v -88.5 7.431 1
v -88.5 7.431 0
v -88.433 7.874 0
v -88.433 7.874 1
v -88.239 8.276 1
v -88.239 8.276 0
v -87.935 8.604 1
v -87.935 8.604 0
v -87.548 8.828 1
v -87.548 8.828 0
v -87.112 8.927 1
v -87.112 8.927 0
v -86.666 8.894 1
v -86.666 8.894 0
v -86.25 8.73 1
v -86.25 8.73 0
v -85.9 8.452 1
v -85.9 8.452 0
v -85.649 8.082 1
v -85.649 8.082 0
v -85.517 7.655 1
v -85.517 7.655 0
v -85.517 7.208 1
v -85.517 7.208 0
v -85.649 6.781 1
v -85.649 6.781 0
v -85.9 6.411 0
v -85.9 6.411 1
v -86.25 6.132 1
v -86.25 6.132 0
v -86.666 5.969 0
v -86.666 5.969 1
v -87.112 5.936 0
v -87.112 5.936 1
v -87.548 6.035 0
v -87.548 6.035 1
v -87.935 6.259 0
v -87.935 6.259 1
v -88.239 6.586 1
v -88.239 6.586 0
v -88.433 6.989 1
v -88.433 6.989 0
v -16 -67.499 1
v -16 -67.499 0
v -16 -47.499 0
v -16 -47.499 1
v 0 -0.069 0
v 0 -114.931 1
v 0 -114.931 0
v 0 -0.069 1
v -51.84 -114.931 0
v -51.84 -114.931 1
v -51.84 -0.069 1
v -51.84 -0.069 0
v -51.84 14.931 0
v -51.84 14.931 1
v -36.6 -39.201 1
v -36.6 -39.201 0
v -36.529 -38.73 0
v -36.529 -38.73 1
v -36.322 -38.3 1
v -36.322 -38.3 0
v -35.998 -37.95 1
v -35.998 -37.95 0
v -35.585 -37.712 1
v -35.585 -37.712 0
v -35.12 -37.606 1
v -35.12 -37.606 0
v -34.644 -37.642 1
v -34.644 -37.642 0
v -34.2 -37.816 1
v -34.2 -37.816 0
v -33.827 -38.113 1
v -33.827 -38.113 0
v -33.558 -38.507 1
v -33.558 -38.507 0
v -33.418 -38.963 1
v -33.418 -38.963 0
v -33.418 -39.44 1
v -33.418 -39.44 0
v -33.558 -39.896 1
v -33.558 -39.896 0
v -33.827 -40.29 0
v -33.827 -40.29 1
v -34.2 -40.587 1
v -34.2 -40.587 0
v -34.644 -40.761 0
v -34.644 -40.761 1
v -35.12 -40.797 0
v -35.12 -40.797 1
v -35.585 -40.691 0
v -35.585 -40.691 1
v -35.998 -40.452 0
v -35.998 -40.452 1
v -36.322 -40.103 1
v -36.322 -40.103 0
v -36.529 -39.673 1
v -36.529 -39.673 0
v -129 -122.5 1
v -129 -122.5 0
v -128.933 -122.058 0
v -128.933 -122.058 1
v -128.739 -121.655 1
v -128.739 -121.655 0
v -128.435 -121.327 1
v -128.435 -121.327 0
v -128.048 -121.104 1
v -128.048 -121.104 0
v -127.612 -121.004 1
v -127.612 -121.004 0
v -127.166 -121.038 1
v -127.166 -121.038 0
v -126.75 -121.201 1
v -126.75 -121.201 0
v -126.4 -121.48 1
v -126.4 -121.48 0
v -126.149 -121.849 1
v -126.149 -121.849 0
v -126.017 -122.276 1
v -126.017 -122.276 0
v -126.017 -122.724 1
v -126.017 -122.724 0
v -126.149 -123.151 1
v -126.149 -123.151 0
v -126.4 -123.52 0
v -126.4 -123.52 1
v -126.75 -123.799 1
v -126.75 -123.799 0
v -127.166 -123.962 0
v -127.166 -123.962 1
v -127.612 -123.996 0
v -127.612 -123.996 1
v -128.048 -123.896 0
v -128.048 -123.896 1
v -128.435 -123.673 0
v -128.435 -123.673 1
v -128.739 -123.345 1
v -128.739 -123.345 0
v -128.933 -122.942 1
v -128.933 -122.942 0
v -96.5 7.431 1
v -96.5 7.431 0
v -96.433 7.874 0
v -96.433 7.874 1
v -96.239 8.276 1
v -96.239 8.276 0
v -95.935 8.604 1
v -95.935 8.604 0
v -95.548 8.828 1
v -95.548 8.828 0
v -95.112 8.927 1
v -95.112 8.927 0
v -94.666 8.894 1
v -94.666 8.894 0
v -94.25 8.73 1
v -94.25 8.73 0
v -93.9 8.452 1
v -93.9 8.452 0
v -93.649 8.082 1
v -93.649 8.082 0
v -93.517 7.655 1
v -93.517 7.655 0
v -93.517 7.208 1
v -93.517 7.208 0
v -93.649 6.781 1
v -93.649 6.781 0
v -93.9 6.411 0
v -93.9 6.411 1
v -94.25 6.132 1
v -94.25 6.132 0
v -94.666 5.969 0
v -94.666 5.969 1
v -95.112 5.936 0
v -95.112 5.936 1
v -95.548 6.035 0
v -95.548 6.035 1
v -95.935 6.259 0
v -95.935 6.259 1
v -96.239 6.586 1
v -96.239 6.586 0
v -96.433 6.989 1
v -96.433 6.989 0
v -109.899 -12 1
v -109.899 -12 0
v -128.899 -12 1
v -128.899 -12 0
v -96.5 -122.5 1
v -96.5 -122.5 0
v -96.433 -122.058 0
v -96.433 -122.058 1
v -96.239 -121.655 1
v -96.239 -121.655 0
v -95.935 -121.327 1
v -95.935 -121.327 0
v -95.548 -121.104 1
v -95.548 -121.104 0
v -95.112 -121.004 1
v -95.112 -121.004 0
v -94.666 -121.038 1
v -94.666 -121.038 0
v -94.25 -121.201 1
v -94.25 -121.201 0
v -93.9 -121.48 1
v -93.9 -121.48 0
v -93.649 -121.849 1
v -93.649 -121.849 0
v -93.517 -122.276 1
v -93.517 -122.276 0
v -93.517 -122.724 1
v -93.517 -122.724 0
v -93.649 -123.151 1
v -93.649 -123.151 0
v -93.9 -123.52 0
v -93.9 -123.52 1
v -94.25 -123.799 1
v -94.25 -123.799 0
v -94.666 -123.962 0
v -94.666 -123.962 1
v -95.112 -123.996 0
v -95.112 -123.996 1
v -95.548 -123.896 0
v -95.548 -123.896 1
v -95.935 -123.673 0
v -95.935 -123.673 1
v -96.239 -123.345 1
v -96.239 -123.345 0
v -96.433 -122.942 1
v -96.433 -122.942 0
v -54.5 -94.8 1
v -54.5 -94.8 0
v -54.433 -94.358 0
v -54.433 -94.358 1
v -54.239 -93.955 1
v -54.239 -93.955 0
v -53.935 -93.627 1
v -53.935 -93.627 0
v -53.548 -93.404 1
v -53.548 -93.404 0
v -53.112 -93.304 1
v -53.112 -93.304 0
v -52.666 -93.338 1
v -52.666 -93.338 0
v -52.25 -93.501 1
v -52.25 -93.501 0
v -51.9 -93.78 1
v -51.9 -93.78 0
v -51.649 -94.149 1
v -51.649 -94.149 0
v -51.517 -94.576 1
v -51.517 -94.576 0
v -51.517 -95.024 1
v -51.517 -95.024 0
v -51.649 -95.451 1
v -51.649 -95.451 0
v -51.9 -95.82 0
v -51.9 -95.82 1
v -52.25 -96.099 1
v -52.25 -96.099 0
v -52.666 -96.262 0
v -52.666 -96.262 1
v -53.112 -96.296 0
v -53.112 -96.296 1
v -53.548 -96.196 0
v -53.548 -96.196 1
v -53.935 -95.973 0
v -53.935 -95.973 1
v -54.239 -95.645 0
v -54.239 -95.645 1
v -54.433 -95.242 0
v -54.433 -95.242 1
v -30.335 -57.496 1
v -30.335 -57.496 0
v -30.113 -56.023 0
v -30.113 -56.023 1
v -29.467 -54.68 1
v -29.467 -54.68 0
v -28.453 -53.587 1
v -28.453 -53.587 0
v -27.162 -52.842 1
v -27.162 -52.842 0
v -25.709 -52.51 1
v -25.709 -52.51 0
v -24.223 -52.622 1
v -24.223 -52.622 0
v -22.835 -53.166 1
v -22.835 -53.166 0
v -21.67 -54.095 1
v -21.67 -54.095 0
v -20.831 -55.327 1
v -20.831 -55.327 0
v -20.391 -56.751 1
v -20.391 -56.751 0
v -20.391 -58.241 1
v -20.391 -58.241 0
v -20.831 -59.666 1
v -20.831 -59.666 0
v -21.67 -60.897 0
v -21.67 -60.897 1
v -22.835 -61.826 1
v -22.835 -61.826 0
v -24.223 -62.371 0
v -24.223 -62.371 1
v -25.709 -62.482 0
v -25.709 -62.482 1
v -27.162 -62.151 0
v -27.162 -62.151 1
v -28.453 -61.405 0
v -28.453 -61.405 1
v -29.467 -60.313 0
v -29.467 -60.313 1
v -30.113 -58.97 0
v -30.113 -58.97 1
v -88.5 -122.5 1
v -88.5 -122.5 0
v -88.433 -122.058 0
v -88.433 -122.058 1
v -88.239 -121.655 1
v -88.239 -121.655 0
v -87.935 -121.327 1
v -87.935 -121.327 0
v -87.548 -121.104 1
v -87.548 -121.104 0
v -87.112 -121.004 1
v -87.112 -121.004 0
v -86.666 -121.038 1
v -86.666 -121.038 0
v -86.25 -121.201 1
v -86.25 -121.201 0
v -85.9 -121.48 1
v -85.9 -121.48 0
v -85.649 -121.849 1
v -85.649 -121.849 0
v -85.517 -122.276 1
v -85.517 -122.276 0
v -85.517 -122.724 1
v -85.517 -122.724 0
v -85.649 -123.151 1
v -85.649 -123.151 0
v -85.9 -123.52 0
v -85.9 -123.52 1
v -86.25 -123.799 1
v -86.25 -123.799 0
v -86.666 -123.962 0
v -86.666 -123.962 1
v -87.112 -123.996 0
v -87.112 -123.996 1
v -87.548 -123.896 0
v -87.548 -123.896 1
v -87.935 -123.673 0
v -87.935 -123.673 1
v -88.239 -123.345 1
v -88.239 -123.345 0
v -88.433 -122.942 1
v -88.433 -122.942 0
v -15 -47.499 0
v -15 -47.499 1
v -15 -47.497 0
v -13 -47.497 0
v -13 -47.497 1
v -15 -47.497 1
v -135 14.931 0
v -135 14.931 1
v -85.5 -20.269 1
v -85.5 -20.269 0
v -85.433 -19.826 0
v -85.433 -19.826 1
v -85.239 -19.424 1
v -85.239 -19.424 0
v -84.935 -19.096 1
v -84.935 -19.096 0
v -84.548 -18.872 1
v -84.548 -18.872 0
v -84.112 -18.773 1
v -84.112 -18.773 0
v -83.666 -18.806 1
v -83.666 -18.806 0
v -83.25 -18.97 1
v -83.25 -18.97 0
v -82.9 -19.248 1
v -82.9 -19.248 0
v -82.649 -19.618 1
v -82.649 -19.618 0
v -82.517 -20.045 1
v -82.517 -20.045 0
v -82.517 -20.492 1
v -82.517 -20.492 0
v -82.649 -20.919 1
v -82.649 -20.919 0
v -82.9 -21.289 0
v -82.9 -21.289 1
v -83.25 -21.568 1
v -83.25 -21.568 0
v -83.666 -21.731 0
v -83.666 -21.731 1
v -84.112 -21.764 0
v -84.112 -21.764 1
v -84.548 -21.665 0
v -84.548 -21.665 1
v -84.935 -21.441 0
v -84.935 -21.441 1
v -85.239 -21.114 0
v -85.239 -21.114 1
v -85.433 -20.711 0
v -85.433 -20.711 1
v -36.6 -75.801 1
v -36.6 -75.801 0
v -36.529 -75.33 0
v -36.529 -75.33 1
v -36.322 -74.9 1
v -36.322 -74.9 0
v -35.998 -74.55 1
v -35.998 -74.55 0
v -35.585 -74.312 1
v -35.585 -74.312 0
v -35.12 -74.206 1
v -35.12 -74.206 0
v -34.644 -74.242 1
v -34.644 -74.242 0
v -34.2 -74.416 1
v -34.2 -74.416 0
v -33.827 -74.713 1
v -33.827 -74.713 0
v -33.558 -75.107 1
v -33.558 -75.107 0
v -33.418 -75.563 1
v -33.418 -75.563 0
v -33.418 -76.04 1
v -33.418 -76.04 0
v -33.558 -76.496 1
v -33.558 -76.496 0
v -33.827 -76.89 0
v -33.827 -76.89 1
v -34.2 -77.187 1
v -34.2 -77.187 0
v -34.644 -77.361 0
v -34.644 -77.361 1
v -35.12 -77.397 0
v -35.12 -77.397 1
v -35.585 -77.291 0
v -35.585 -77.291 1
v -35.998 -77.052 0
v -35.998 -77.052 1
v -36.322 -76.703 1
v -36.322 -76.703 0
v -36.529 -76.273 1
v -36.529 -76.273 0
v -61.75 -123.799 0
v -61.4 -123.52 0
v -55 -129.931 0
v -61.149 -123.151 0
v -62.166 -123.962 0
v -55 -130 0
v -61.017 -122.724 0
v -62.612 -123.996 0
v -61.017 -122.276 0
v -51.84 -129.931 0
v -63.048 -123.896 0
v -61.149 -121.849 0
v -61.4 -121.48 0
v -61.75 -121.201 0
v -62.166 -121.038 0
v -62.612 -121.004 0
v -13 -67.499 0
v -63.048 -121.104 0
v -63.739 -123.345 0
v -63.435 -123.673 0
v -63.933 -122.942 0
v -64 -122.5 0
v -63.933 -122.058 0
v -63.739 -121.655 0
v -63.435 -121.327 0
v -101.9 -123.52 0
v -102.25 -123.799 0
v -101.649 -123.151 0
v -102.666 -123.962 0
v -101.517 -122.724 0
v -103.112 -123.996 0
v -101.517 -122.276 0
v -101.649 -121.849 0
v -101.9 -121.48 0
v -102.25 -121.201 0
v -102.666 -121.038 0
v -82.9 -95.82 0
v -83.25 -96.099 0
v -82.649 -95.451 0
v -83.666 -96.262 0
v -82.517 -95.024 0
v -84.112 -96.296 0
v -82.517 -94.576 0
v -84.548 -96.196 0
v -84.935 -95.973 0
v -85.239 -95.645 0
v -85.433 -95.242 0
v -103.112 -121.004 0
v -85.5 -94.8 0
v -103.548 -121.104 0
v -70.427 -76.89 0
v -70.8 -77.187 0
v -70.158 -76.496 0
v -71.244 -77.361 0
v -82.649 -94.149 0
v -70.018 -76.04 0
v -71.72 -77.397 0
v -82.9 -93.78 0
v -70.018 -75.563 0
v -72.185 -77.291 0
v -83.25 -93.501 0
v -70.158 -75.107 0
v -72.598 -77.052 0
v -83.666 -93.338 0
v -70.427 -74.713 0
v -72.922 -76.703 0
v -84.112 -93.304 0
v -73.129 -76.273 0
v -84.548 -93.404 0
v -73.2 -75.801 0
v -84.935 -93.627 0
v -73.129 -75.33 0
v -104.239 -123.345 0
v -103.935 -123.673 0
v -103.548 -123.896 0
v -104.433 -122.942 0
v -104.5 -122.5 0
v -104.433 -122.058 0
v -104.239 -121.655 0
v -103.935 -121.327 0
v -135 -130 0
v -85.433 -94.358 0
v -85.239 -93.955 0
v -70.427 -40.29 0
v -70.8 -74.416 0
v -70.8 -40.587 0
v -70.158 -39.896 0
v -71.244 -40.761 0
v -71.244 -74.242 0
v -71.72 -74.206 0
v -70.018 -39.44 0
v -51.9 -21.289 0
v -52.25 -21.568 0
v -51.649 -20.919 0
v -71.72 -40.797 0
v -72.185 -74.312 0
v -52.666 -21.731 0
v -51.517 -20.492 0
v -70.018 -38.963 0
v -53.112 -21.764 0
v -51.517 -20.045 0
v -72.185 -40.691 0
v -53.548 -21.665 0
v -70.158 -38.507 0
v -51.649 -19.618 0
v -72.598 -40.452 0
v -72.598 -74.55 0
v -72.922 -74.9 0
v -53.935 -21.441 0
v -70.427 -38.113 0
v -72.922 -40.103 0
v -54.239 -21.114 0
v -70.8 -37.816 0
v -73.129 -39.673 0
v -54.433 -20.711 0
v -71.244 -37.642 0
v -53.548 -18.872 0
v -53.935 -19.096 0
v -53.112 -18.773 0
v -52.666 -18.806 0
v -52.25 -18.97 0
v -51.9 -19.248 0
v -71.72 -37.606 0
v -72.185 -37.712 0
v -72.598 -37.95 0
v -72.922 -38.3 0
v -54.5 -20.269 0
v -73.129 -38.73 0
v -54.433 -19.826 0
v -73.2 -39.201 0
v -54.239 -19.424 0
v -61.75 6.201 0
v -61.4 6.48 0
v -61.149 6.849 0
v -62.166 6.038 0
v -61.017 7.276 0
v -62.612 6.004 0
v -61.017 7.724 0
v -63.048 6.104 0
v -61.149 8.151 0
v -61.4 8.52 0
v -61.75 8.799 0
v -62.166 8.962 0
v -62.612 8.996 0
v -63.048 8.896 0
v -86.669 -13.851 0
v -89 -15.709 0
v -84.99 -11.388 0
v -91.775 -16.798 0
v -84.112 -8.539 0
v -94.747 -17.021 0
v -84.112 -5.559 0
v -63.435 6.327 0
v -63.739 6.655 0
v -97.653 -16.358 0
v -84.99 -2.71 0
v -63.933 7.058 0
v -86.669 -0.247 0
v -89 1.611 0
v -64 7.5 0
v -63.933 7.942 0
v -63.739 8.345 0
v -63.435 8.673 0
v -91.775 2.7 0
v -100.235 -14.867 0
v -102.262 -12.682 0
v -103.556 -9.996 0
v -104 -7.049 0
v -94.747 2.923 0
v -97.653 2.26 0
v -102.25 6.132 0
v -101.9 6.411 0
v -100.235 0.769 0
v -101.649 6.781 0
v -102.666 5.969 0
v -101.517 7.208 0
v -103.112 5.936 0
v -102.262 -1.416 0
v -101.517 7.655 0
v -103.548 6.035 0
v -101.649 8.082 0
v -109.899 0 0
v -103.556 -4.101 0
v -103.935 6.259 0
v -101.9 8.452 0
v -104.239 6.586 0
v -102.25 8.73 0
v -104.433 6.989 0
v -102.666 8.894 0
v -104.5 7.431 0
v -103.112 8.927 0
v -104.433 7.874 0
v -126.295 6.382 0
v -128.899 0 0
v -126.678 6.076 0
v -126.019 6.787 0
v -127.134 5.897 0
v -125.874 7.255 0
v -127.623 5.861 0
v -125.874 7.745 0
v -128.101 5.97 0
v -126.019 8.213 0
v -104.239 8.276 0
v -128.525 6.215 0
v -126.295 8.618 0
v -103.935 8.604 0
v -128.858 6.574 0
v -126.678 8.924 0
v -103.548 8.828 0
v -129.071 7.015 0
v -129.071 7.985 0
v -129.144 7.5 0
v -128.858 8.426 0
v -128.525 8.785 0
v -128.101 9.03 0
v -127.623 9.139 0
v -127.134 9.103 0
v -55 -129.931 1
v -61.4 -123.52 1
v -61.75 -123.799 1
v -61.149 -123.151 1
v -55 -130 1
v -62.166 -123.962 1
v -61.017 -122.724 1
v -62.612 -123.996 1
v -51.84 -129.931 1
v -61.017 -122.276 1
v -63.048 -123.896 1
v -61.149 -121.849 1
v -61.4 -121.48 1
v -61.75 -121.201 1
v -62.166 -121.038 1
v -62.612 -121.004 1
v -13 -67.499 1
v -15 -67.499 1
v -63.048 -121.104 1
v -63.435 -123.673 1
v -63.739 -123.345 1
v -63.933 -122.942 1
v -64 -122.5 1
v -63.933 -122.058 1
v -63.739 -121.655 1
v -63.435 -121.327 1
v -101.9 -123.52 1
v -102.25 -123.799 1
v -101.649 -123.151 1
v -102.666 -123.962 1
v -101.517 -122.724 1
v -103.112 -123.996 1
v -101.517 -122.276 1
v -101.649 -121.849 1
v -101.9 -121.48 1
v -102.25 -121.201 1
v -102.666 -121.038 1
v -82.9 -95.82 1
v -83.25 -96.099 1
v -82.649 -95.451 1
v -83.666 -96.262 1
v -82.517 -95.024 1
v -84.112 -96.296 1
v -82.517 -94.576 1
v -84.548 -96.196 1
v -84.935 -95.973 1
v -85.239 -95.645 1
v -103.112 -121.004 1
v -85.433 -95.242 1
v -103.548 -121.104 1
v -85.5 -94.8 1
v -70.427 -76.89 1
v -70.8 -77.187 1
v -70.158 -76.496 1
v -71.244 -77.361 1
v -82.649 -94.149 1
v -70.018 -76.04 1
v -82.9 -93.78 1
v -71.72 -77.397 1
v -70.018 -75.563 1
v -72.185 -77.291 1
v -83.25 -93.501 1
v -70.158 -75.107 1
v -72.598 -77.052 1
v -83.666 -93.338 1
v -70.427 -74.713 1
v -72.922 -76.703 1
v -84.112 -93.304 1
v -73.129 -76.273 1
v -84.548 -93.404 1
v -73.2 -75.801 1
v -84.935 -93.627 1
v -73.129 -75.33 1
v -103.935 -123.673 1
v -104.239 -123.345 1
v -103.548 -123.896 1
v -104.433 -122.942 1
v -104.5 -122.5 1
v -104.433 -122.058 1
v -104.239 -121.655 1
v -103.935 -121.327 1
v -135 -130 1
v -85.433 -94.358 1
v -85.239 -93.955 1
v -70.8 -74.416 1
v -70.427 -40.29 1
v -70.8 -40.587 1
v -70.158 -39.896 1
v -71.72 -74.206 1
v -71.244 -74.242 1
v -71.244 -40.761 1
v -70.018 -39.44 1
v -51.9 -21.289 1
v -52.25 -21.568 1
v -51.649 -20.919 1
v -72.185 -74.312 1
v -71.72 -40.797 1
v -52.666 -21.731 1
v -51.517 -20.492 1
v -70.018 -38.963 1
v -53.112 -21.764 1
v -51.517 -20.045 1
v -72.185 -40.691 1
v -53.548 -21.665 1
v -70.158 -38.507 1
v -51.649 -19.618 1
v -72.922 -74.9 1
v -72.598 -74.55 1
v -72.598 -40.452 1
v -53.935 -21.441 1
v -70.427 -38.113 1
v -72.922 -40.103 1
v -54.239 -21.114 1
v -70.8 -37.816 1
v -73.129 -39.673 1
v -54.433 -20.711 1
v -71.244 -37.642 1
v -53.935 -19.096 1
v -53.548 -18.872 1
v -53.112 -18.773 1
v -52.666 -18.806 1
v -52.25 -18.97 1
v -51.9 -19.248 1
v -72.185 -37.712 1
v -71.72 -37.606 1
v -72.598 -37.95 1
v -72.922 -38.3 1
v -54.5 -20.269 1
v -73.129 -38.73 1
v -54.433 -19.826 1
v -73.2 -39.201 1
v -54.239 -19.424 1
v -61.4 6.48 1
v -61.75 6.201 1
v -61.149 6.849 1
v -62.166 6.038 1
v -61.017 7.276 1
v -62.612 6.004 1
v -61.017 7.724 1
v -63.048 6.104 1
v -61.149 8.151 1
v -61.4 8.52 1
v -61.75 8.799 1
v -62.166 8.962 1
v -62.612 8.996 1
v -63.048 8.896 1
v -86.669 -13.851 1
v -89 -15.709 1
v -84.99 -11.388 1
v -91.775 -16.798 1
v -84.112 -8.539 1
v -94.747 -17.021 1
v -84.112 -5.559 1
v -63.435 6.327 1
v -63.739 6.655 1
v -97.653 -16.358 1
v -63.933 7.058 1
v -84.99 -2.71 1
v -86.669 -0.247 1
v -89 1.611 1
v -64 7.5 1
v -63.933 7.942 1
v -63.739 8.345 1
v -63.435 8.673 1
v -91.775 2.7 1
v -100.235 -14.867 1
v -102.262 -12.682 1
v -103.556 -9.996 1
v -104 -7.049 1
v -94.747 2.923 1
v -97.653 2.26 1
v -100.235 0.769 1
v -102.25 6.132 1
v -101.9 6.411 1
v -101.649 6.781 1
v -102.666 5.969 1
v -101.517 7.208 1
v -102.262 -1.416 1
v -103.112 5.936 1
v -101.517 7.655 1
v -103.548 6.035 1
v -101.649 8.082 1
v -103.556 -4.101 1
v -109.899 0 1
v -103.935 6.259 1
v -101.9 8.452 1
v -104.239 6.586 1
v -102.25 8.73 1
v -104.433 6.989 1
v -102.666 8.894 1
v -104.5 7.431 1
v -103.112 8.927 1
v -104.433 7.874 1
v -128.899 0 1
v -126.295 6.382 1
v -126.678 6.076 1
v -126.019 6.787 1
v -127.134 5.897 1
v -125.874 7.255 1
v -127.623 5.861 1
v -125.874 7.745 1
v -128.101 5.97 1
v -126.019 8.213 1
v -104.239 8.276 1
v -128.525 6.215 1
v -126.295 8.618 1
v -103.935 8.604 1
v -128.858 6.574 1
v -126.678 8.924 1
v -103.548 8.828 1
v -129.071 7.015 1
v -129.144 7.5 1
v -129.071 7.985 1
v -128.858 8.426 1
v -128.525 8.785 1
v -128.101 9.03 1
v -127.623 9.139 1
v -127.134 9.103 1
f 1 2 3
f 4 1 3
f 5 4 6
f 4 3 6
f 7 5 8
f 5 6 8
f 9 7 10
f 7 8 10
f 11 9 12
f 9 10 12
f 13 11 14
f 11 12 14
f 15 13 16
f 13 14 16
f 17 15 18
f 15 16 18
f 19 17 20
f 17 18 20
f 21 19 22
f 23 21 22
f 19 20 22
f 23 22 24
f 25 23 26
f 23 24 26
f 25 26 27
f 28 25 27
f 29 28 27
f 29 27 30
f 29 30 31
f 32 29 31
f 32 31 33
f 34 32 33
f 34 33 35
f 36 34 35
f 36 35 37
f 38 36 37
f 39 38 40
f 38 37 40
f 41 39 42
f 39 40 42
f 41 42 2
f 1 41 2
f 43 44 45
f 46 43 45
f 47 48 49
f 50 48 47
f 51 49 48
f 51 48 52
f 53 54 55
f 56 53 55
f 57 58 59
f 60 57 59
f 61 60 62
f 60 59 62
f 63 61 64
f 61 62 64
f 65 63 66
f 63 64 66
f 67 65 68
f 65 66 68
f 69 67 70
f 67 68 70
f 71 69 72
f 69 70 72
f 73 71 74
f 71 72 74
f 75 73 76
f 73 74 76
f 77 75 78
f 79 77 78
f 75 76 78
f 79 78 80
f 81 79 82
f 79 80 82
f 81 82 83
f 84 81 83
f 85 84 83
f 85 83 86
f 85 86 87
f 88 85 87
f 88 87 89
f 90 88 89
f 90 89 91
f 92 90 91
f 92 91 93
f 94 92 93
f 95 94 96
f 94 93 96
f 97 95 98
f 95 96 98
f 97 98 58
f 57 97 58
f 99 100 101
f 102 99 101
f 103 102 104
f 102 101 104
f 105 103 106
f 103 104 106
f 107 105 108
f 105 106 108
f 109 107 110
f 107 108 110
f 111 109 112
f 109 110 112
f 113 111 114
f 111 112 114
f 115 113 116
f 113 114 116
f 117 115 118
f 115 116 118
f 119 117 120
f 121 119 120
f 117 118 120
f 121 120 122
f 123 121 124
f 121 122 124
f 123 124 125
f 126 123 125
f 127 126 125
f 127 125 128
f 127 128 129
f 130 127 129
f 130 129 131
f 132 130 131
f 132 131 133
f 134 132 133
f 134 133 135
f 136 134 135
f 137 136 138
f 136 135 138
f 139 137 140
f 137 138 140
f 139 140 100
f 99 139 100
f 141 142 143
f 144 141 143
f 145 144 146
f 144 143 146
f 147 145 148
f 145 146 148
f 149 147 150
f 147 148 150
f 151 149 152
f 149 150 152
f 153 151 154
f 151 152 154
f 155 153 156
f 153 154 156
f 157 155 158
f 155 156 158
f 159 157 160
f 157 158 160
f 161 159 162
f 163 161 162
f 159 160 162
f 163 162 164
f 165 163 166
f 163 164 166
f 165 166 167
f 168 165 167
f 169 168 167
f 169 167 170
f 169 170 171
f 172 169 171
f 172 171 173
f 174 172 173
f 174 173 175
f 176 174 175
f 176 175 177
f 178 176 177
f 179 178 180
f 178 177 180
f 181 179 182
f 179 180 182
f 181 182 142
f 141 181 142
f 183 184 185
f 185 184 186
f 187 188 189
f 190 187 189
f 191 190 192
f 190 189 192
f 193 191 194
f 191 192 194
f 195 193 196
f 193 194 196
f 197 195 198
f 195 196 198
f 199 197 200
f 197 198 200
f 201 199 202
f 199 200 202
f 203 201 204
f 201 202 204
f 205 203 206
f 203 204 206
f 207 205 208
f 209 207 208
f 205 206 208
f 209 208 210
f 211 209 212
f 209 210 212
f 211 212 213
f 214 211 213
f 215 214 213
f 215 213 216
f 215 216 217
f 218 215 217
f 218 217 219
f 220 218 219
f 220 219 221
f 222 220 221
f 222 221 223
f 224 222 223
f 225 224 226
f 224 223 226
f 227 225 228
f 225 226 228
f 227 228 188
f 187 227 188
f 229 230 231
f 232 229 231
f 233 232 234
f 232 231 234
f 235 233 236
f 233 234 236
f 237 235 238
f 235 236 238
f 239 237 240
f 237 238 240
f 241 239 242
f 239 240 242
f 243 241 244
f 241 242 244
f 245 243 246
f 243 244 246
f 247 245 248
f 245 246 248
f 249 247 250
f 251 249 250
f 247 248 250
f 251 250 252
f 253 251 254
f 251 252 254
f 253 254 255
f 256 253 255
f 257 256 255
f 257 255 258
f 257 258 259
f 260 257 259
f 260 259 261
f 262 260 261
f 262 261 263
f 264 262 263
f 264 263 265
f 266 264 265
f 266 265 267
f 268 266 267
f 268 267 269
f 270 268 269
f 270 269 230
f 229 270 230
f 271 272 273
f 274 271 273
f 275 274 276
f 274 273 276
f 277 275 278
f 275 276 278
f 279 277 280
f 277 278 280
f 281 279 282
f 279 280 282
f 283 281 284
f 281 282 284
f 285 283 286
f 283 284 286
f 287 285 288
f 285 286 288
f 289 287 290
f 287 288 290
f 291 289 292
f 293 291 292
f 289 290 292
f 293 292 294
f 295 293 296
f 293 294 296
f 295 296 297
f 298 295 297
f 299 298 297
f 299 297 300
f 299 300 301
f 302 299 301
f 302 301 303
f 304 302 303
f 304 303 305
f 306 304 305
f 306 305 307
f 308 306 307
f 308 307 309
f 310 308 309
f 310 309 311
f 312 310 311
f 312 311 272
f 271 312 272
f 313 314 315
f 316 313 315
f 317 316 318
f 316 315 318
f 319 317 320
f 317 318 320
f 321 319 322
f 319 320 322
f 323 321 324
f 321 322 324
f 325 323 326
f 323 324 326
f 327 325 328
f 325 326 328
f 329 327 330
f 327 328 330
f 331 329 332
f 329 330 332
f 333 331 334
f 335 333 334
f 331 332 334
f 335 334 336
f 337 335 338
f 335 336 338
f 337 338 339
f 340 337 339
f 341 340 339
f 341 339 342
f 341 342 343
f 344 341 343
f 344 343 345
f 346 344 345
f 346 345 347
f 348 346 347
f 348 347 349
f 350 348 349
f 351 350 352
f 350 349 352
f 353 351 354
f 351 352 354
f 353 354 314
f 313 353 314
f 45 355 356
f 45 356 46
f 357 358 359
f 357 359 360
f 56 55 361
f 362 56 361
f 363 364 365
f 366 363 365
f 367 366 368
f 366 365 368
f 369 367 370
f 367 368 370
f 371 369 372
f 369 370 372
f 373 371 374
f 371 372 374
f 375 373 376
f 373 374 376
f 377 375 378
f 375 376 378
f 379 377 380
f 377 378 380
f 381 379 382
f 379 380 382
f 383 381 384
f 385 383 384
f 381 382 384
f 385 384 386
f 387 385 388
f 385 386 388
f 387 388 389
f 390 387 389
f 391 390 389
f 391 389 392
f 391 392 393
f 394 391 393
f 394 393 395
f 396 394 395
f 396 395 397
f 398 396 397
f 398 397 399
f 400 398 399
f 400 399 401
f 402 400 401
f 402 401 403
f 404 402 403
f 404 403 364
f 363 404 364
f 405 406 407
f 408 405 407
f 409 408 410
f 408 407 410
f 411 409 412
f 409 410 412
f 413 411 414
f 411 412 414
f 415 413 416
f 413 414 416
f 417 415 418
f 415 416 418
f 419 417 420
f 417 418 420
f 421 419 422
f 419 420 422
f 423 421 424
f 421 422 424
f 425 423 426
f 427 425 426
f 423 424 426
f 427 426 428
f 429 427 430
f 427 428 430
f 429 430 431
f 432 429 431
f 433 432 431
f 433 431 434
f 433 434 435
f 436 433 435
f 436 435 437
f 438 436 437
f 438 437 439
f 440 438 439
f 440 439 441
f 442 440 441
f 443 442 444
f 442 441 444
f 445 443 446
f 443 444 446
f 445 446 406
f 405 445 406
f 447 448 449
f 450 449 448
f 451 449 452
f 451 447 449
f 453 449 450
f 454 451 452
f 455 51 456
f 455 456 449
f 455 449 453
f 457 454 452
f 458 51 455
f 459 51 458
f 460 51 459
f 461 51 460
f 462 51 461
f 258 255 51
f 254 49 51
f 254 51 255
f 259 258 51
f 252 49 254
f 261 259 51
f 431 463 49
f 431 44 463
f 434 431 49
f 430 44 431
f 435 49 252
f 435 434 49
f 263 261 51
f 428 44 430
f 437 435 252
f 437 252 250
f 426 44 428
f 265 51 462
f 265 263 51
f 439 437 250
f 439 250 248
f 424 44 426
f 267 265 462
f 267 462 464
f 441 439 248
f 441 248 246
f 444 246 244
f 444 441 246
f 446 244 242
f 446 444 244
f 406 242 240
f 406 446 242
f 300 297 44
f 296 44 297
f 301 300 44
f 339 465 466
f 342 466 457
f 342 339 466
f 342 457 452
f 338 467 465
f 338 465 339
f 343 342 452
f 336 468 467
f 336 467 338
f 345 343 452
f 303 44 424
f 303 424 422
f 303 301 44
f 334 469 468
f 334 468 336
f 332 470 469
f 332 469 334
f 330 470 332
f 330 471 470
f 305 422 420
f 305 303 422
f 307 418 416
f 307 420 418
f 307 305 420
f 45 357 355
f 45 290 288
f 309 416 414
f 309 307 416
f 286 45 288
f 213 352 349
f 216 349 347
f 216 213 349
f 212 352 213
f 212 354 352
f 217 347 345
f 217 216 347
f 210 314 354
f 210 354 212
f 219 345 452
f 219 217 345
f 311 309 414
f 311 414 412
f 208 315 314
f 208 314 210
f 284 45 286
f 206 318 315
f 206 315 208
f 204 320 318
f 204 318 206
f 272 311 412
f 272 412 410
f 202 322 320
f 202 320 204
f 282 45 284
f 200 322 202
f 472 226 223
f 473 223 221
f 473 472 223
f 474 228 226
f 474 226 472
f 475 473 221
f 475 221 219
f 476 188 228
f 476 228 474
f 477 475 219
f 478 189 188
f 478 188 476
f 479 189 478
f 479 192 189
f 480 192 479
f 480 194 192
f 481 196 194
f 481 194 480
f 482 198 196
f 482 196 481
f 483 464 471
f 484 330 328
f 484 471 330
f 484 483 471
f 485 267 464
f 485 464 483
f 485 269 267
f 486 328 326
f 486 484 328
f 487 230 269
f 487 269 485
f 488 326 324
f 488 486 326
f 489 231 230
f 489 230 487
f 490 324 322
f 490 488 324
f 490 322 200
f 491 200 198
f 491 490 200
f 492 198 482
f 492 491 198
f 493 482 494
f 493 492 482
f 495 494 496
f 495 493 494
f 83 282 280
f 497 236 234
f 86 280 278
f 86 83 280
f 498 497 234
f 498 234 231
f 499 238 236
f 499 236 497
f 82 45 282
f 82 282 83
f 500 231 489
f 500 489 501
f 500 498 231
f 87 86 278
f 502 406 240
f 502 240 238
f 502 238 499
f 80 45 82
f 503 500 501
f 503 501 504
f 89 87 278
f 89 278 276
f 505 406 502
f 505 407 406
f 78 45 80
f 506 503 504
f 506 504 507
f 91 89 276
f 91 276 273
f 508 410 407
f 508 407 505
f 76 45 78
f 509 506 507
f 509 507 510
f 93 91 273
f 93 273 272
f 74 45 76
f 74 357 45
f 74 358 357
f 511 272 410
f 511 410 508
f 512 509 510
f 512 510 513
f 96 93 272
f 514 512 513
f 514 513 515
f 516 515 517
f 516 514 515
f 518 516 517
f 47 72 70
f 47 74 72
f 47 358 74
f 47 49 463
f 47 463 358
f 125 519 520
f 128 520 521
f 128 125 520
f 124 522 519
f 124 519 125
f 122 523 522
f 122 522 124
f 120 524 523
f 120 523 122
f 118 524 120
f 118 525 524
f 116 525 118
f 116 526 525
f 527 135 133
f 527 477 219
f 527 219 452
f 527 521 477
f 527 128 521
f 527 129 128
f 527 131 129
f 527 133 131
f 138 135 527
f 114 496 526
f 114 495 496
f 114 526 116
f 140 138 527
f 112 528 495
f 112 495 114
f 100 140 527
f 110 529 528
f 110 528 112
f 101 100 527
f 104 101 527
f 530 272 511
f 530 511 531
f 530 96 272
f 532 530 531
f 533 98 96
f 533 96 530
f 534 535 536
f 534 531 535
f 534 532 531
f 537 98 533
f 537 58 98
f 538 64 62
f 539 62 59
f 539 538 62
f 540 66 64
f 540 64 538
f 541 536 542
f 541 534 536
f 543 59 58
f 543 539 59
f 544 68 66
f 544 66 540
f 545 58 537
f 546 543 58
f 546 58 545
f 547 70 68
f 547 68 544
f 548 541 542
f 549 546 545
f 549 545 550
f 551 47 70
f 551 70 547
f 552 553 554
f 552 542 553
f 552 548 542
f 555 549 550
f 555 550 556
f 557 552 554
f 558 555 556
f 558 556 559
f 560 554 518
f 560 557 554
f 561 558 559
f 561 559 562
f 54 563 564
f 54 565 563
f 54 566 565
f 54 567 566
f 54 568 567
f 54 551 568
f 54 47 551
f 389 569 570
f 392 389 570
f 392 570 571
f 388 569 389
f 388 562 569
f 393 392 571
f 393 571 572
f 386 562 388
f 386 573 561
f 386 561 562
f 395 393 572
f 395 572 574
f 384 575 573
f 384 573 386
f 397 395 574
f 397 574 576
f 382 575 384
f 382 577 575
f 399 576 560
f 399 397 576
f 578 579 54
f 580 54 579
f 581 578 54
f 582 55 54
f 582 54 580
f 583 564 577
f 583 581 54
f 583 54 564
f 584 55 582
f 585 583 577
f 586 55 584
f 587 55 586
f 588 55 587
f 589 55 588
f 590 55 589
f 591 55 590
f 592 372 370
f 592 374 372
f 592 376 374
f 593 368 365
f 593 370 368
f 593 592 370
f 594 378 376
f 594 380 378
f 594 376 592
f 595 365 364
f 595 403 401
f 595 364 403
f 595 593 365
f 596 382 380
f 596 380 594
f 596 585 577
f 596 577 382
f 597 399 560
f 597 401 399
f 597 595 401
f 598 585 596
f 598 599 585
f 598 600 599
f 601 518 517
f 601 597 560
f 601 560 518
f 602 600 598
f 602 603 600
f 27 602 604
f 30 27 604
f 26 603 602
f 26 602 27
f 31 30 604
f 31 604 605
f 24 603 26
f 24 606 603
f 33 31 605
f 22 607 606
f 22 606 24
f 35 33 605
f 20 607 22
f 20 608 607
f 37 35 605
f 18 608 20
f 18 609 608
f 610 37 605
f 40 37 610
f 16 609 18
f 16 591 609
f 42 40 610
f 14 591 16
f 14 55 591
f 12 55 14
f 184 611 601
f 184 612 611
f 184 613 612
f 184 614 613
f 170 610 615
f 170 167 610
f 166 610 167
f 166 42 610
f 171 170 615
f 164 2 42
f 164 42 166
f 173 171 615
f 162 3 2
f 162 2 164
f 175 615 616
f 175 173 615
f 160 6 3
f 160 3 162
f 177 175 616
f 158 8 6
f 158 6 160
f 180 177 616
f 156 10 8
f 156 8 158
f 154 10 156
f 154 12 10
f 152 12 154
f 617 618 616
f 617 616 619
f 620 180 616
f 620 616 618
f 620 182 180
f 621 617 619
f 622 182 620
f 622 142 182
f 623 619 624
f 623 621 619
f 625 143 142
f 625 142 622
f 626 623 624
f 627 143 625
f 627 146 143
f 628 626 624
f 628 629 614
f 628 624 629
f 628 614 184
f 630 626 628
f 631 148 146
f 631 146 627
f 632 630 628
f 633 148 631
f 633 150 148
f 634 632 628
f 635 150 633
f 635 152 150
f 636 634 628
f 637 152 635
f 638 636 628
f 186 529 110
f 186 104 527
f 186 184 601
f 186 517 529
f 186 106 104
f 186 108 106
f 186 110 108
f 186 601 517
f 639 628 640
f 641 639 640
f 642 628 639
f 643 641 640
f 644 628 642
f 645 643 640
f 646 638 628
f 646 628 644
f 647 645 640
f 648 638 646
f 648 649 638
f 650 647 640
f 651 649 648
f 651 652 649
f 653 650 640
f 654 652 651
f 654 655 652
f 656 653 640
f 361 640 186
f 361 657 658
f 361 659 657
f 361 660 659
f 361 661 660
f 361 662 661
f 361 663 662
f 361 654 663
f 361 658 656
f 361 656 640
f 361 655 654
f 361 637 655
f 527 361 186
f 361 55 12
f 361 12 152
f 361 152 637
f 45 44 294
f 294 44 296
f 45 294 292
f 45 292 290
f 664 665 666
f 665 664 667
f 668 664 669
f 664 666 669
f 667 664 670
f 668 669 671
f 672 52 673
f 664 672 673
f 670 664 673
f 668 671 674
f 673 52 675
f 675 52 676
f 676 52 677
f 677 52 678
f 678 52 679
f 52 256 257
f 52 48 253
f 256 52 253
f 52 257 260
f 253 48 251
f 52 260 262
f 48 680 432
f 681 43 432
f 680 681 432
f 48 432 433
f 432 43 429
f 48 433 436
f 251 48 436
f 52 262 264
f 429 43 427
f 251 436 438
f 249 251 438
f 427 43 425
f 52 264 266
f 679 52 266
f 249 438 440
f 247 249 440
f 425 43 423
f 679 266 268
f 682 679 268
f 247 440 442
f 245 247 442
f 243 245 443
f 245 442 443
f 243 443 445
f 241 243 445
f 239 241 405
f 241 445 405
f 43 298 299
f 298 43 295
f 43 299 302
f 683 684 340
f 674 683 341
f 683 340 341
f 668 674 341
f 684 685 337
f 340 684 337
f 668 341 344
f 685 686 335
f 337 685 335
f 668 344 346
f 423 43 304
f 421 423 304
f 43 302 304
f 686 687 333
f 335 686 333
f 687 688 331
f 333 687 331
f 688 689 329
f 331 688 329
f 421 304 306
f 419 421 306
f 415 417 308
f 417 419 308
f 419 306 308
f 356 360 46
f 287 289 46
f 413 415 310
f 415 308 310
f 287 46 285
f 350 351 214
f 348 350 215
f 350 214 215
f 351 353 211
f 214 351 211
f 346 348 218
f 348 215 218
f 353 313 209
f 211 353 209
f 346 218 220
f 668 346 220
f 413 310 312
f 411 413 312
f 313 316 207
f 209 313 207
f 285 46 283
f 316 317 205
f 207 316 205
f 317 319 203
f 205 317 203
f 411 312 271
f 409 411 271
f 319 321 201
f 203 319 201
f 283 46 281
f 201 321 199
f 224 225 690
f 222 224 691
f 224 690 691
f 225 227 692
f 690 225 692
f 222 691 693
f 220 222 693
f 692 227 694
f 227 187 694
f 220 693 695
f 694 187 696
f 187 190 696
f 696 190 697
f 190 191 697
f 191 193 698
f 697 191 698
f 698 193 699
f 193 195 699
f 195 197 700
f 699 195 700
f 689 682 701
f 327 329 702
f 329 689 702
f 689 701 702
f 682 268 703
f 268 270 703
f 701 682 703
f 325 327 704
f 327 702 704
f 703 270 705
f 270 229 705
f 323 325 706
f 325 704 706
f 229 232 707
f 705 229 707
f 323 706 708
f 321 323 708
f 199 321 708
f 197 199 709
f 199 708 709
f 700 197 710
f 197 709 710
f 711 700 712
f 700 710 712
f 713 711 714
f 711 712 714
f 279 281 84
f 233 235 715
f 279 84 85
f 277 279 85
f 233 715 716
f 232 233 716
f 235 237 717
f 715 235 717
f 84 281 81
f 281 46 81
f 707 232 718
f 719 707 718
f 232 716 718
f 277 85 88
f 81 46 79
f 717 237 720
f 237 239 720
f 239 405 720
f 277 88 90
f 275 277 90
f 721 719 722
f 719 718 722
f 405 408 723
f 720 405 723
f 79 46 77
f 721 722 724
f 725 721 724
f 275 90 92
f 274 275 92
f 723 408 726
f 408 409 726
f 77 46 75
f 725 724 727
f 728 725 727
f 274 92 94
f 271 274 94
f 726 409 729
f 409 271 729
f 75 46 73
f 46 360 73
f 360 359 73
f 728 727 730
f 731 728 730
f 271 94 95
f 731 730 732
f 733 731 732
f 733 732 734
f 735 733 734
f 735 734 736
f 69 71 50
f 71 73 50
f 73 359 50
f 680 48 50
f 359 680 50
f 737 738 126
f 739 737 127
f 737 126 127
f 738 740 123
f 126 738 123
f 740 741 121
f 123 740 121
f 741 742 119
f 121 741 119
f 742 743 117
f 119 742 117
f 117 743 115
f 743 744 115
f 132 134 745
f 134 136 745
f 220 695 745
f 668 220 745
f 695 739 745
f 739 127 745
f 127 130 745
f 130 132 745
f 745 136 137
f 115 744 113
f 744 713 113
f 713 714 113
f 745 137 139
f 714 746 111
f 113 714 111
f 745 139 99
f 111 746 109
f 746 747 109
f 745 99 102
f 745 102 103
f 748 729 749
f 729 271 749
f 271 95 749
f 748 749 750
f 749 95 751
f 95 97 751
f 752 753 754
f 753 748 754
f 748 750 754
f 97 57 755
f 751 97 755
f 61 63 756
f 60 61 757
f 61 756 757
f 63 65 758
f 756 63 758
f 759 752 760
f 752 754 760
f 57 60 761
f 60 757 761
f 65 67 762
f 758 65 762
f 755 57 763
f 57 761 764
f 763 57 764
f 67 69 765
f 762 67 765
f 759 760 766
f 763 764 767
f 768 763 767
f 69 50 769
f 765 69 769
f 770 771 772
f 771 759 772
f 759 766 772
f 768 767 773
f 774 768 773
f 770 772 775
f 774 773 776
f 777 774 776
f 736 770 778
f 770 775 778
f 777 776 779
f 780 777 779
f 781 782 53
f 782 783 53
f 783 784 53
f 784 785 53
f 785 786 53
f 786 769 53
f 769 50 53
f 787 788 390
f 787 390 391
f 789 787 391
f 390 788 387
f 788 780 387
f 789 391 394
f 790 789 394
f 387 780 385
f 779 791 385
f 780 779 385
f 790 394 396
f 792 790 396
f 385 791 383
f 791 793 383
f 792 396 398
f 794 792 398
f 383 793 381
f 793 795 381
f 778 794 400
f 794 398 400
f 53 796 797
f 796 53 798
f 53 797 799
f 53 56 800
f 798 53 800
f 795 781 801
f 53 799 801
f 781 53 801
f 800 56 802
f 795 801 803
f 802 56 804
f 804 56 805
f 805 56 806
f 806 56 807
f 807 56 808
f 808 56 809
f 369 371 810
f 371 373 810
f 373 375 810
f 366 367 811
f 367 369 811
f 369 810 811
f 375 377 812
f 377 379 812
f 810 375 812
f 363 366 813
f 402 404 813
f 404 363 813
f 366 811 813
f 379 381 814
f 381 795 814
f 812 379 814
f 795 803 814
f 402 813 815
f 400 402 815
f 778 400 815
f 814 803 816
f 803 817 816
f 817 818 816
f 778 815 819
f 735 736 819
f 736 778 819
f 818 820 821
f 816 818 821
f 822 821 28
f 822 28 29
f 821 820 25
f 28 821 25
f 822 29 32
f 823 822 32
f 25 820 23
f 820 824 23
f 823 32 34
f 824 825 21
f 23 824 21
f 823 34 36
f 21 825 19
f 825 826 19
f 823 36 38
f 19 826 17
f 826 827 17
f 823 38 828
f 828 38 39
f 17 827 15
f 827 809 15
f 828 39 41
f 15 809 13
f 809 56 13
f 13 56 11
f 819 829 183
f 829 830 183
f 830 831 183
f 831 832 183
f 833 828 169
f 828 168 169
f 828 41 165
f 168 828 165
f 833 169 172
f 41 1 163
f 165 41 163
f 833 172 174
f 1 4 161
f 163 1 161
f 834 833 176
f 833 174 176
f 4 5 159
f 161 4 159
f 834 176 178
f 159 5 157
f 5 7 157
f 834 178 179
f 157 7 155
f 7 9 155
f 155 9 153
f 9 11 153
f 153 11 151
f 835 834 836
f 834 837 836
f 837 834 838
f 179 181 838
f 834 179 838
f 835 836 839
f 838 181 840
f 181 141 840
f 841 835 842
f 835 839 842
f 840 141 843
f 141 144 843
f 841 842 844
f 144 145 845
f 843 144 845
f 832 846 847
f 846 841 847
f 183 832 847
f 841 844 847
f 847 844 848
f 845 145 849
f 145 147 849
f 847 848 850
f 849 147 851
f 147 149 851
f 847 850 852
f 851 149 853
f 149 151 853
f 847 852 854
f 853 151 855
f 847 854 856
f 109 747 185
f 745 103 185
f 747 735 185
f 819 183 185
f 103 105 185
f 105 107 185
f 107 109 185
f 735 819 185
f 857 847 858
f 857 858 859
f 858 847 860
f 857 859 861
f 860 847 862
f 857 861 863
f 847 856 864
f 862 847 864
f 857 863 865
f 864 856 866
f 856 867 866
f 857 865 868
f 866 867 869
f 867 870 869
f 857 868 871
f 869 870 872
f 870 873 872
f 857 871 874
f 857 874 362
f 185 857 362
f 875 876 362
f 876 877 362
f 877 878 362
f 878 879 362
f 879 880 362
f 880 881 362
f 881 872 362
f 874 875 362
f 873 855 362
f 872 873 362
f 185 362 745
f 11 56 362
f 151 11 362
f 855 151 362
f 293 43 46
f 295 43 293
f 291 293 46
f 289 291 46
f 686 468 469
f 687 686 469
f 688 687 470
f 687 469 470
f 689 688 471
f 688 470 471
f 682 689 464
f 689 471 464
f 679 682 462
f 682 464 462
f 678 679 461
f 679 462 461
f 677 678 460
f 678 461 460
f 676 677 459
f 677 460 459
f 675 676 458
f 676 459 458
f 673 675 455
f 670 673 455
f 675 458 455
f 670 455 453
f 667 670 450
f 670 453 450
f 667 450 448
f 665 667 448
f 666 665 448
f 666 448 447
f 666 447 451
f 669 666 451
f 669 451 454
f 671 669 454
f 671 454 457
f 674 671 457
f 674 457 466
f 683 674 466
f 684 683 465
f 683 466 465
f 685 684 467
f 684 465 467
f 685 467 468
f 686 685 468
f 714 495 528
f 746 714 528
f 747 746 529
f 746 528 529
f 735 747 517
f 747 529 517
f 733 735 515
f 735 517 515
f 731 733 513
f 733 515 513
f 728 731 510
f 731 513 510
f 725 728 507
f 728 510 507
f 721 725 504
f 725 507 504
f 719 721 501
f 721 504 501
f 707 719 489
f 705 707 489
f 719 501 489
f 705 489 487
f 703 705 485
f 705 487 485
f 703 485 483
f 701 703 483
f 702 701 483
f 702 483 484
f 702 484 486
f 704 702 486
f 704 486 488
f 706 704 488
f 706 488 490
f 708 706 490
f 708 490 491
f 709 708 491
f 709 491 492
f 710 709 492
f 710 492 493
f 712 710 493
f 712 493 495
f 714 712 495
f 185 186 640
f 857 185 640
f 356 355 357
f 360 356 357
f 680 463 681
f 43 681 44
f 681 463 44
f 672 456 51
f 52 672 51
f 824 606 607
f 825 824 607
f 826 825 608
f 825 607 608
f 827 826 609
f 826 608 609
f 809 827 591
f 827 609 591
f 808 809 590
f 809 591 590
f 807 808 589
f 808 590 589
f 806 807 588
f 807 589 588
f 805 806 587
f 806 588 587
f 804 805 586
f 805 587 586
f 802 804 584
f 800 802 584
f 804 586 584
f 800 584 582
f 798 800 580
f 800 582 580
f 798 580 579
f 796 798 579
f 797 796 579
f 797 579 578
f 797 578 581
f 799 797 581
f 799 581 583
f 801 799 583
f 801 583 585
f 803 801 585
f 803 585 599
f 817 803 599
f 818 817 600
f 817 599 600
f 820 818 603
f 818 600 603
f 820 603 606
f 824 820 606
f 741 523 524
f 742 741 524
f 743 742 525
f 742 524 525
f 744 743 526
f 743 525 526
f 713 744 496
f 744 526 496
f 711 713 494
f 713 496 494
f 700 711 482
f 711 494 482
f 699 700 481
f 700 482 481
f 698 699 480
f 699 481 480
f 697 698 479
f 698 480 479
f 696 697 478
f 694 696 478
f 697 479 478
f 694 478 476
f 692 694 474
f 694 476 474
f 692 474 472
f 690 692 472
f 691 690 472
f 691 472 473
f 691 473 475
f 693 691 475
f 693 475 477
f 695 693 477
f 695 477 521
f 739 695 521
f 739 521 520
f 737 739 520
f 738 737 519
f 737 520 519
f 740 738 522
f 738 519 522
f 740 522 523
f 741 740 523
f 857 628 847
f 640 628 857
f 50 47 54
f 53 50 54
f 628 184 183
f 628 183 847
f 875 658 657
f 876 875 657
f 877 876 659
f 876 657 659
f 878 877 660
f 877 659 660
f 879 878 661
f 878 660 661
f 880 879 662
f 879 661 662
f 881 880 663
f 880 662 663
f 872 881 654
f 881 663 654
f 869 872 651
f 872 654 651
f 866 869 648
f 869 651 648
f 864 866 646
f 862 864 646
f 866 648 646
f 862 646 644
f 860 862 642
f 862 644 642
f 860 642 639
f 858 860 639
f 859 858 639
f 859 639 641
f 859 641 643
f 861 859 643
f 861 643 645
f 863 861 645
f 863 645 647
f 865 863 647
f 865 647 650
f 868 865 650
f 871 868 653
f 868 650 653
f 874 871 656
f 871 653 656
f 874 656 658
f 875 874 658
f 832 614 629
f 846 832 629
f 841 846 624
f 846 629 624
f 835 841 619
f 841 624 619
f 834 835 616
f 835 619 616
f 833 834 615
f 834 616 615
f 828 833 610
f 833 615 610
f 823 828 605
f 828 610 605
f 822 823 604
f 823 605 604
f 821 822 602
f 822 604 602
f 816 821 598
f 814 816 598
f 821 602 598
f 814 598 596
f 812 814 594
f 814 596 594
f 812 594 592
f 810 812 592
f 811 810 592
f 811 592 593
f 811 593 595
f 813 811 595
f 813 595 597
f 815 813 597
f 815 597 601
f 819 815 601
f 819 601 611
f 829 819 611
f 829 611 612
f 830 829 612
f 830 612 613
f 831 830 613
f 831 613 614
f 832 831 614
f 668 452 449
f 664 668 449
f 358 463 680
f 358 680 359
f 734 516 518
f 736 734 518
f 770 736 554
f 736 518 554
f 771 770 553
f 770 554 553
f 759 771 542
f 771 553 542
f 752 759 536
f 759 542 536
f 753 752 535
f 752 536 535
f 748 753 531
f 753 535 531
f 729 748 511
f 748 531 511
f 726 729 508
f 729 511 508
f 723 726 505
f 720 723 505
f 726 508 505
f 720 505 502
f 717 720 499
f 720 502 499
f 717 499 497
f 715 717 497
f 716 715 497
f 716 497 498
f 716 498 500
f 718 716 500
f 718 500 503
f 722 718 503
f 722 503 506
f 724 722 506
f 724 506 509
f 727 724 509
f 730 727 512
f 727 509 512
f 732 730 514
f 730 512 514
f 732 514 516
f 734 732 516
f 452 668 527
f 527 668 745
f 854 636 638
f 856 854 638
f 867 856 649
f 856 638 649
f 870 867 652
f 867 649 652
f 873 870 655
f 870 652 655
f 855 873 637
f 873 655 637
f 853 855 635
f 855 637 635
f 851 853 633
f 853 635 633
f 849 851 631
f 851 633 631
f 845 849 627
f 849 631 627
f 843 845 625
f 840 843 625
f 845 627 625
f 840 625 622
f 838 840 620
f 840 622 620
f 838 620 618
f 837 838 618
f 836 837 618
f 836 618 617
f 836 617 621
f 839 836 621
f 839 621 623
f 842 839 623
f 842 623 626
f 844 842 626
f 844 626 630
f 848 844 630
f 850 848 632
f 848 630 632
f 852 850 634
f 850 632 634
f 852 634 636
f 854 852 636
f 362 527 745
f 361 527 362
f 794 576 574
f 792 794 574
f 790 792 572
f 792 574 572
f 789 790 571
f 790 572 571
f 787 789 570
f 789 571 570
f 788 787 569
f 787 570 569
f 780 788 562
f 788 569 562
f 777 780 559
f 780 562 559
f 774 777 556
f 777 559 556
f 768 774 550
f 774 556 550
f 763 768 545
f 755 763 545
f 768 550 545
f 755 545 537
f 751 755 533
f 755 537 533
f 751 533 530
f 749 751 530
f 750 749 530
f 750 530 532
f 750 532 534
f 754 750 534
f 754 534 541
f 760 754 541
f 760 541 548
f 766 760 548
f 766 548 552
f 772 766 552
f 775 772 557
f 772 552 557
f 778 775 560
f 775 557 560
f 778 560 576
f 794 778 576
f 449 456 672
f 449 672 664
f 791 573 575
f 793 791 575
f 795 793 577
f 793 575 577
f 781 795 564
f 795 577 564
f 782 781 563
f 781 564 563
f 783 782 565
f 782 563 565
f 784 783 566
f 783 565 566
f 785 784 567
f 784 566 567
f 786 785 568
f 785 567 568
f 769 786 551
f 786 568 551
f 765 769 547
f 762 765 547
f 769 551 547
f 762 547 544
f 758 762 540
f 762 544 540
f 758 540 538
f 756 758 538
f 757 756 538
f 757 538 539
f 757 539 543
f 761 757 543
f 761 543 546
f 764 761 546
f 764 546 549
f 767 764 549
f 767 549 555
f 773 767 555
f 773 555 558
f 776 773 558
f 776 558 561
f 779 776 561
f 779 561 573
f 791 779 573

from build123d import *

# Parameters (mm, degrees)
SKETCH1_W            = 135
SKETCH1_H            = 115
BOSS_EXTRUDE1_DEPTH  = 1
SKETCH3_W            = 15
SKETCH3_H            = 15
BOSS_EXTRUDE3_DEPTH  = 1
SKETCH4_W            = 15
SKETCH4_H            = 15
BOSS_EXTRUDE4_DEPTH  = 1
SKETCH5_R            = 1.5
SKETCH5_R_2          = 1.644092979
CUT_EXTRUDE1_DEPTH   = 1
BOSS_EXTRUDE5_START  = -1
SKETCH6_W            = 50
SKETCH6_H            = 15
BOSS_EXTRUDE5_DEPTH  = 1
SKETCH7_W            = 55
SKETCH7_H            = 14.931429571
BOSS_EXTRUDE6_DEPTH  = 1
SKETCH8_W            = 55
SKETCH8_H            = 14.931429571
BOSS_EXTRUDE10_DEPTH = 1
SKETCH9_W            = 50
SKETCH9_H            = 15
BOSS_EXTRUDE11_DEPTH = 1
SKETCH10_W           = 135
SKETCH10_H           = 20
BOSS_EXTRUDE12_DEPTH = 1
SKETCH12_W           = 135
SKETCH12_H           = 20
CUT_EXTRUDE2_DEPTH   = 1
SKETCH14_W           = 51.839856939
SKETCH14_H           = 15
CUT_EXTRUDE3_DEPTH   = 1
SKETCH15_R           = 1.5
CUT_EXTRUDE5_DEPTH   = 10
SKETCH16_R           = 1.5
CUT_EXTRUDE6_DEPTH   = 10
SKETCH17_R           = 1.6
CUT_EXTRUDE9_DEPTH   = 1
SKETCH18_R           = 1.5
SKETCH18_R_2         = 10
CUT_EXTRUDE10_DEPTH  = 10
SKETCH19_R           = 10
CUT_EXTRUDE11_DEPTH  = 10
SKETCH20_W           = 19
SKETCH20_H           = 12
CUT_EXTRUDE12_DEPTH  = 10
SKETCH21_R           = 5
SKETCH21_W           = 1
SKETCH21_H           = 20
CUT_EXTRUDE13_DEPTH  = 10
SKETCH22_R           = 1.5
CUT_EXTRUDE14_DEPTH  = 10
SKETCH23_R           = 1.623611173
SKETCH23_R_2         = 1.5
SKETCH23_R_3         = 1.457682771
SKETCH23_R_4         = 10
SKETCH23_R_5         = 2.633238526
BOSS_EXTRUDE14_DEPTH = 1
SKETCH24_R           = 1.891339509
BOSS_EXTRUDE15_DEPTH = 1
SKETCH25_W           = 2
SKETCH25_H           = 20.001507343
CUT_EXTRUDE15_DEPTH  = 1
SKETCH26_R           = 1.5
CUT_EXTRUDE16_DEPTH  = 1


with BuildPart() as part:
    # Sketch1 → Boss-Extrude1 (new body)
    with BuildSketch(Plane.XY):
        with Locations((-67.5, -57.5)):
            Rectangle(SKETCH1_W, SKETCH1_H)
    extrude(amount=BOSS_EXTRUDE1_DEPTH)

    # Sketch3 → Boss-Extrude3 (add)
    with BuildSketch(Plane(origin=(0, 0, 0), x_dir=(-1, 0, 0), z_dir=(0, 0, -1))):
        with Locations((127.5, -122.5)):
            Rectangle(SKETCH3_W, SKETCH3_H)
        with Locations((127.5, 7.5)):
            Rectangle(SKETCH3_W, SKETCH3_H)
    extrude(amount=-BOSS_EXTRUDE3_DEPTH)

    # Sketch4 → Boss-Extrude4 (add)
    with BuildSketch(Plane(origin=(0, 0, 0), x_dir=(-1, 0, 0), z_dir=(0, 0, -1))):
        with Locations((62.5, -122.5)):
            Rectangle(SKETCH4_W, SKETCH4_H)
        with Locations((62.5, 7.5)):
            Rectangle(SKETCH4_W, SKETCH4_H)
    extrude(amount=-BOSS_EXTRUDE4_DEPTH)

    # Sketch5 → Cut-Extrude1 (cut)
    with BuildSketch(Plane(origin=(0, 0, 0), x_dir=(-1, 0, 0), z_dir=(0, 0, -1))):
        with Locations((62.5, -122.5)):
            Circle(SKETCH5_R)
        with Locations((127.5, -122.5)):
            Circle(SKETCH5_R)
        with Locations((62.5, 7.5)):
            Circle(SKETCH5_R)
        with Locations((127.5, 7.5)):
            Circle(SKETCH5_R_2)
    extrude(amount=-CUT_EXTRUDE1_DEPTH, mode=Mode.SUBTRACT)

    # Sketch6 → Boss-Extrude5 (add)
    with BuildSketch(Plane(origin=(0, 0, 0), x_dir=(-1, 0, 0), z_dir=(0, 0, -1)).offset(BOSS_EXTRUDE5_START)):
        with Locations((95, -122.5)):
            Rectangle(SKETCH6_W, SKETCH6_H)
    extrude(amount=BOSS_EXTRUDE5_DEPTH)

    # Sketch7 → Boss-Extrude6 (add)
    with BuildSketch(Plane(origin=(0, 0, 0), x_dir=(-1, 0, 0), z_dir=(0, 0, -1))):
        with Locations((27.5, -122.465714786)):
            Rectangle(SKETCH7_W, SKETCH7_H)
    extrude(amount=-BOSS_EXTRUDE6_DEPTH)

    # Sketch8 → Boss-Extrude10 (add)
    with BuildSketch(Plane(origin=(0, 0, 0), x_dir=(-1, 0, 0), z_dir=(0, 0, -1))):
        with Locations((27.5, 7.465714786)):
            Rectangle(SKETCH8_W, SKETCH8_H)
    extrude(amount=-BOSS_EXTRUDE10_DEPTH)

    # Sketch9 → Boss-Extrude11 (add)
    with BuildSketch(Plane(origin=(0, 0, 0), x_dir=(-1, 0, 0), z_dir=(0, 0, -1))):
        with Locations((95, 7.5)):
            Rectangle(SKETCH9_W, SKETCH9_H)
    extrude(amount=-BOSS_EXTRUDE11_DEPTH)

    # Sketch10 → Boss-Extrude12 (add)
    with BuildSketch(Plane.XY.offset(1)):
        with Locations((-67.5, 24.931429571)):
            Rectangle(SKETCH10_W, SKETCH10_H)
    extrude(amount=-BOSS_EXTRUDE12_DEPTH)

    # Sketch12 → Cut-Extrude2 (cut)
    with BuildSketch(Plane(origin=(0, 0, 0), x_dir=(-1, 0, 0), z_dir=(0, 0, -1))):
        with Locations((67.5, 24.931429571)):
            Rectangle(SKETCH12_W, SKETCH12_H)
    extrude(amount=-CUT_EXTRUDE2_DEPTH, mode=Mode.SUBTRACT)

    # Sketch14 → Cut-Extrude3 (cut)
    with BuildSketch(Plane(origin=(0, 0, 0), x_dir=(-1, 0, 0), z_dir=(0, 0, -1))):
        with Locations((25.91992847, -122.431429571)):
            Rectangle(SKETCH14_W, SKETCH14_H)
        with Locations((25.91992847, 7.431429571)):
            Rectangle(SKETCH14_W, SKETCH14_H)
    extrude(amount=-CUT_EXTRUDE3_DEPTH, mode=Mode.SUBTRACT)

    # Sketch15 → Cut-Extrude5 (cut)
    with BuildSketch(Plane(origin=(0, 0, 0), x_dir=(-1, 0, 0), z_dir=(0, 0, -1))):
        with Locations((71.839856939, -125)):
            Circle(SKETCH15_R)
        with Locations((113.463350925, -125)):
            Circle(SKETCH15_R)
        with Locations((100, -125)):
            Circle(SKETCH15_R)
        with Locations((87, -125)):
            Circle(SKETCH15_R)
        with Locations((100, 9.931429571)):
            Circle(SKETCH15_R)
        with Locations((87, 9.931429571)):
            Circle(SKETCH15_R)
        with Locations((32.99653198, -109.931429571)):
            Circle(SKETCH15_R)
        with Locations((20, -109.631168863)):
            Circle(SKETCH15_R)
        with Locations((32.99653198, -5.068570429)):
            Circle(SKETCH15_R)
        with Locations((20, -5.068570429)):
            Circle(SKETCH15_R)
    extrude(amount=-CUT_EXTRUDE5_DEPTH, mode=Mode.SUBTRACT)

    # Sketch16 → Cut-Extrude6 (cut)
    with BuildSketch(Plane(origin=(0, 0, 0), x_dir=(-1, 0, 0), z_dir=(0, 0, -1))):
        with Locations((130, -95)):
            Circle(SKETCH16_R)
        with Locations((130, -82)):
            Circle(SKETCH16_R)
        with Locations((130, -33.068570429)):
            Circle(SKETCH16_R)
        with Locations((130, -20.068570429)):
            Circle(SKETCH16_R)
    extrude(amount=-CUT_EXTRUDE6_DEPTH, mode=Mode.SUBTRACT)

    # Sketch17 → Cut-Extrude9 (cut)
    with BuildSketch(Plane(origin=(0, 0, 0), x_dir=(-1, 0, 0), z_dir=(0, 0, -1))):
        with Locations((35, -75.801429571)):
            Circle(SKETCH17_R)
        with Locations((35, -39.201429571)):
            Circle(SKETCH17_R)
        with Locations((71.6, -39.201429571)):
            Circle(SKETCH17_R)
        with Locations((71.6, -75.801429571)):
            Circle(SKETCH17_R)
    extrude(amount=-CUT_EXTRUDE9_DEPTH, mode=Mode.SUBTRACT)

    # Sketch18 → Cut-Extrude10 (cut)
    with BuildSketch(Plane(origin=(0, 0, 0), x_dir=(-1, 0, 0), z_dir=(0, 0, -1))):
        with Locations((115, -20.268570429)):
            Circle(SKETCH18_R)
        with Locations((115, -94.8)):
            Circle(SKETCH18_R)
        with Locations((84, -20.268570429)):
            Circle(SKETCH18_R)
        with Locations((84, -94.8)):
            Circle(SKETCH18_R)
        with Locations((95, -107.048943692)):
            Circle(SKETCH18_R_2)
    extrude(amount=-CUT_EXTRUDE10_DEPTH, mode=Mode.SUBTRACT)

    # Sketch19 → Cut-Extrude11 (cut)
    with BuildSketch(Plane(origin=(0, 0, 0), x_dir=(-1, 0, 0), z_dir=(0, 0, -1))):
        with Locations((94, -7.048943692)):
            Circle(SKETCH19_R)
    extrude(amount=-CUT_EXTRUDE11_DEPTH, mode=Mode.SUBTRACT)

    # Sketch20 → Cut-Extrude12 (cut)
    with BuildSketch(Plane(origin=(0, 0, 0), x_dir=(-1, 0, 0), z_dir=(0, 0, -1))):
        with Locations((119.399363066, -6)):
            Rectangle(SKETCH20_W, SKETCH20_H)
    extrude(amount=-CUT_EXTRUDE12_DEPTH, mode=Mode.SUBTRACT)

    # Sketch21 → Cut-Extrude13 (cut)
    with BuildSketch(Plane(origin=(0, 0, 0), x_dir=(-1, 0, 0), z_dir=(0, 0, -1))):
        with Locations((25.335439778, -57.496285719)):
            Circle(SKETCH21_R)
        with Locations((15.5, -57.498570429)):
            Rectangle(SKETCH21_W, SKETCH21_H)
    extrude(amount=-CUT_EXTRUDE13_DEPTH, mode=Mode.SUBTRACT)

    # Sketch22 → Cut-Extrude14 (cut)
    with BuildSketch(Plane(origin=(0, 0, 0), x_dir=(-1, 0, 0), z_dir=(0, 0, -1))):
        with Locations((53, -20.268570429)):
            Circle(SKETCH22_R)
        with Locations((53, -94.8)):
            Circle(SKETCH22_R)
    extrude(amount=-CUT_EXTRUDE14_DEPTH, mode=Mode.SUBTRACT)

    # Sketch23 → Boss-Extrude14 (add)
    with BuildSketch(Plane(origin=(0, 0, 0), x_dir=(-1, 0, 0), z_dir=(0, 0, -1))):
        with Locations((19.911217807, -5.154578825)):
            Circle(SKETCH23_R)
        with Locations((32.99653198, -5.068570429)):
            Circle(SKETCH23_R_2)
        with Locations((100, 9.931429571)):
            Circle(SKETCH23_R_2)
        with Locations((86.957682771, 9.931429571)):
            Circle(SKETCH23_R_3)
        with Locations((95, -107.048943692)):
            Circle(SKETCH23_R_4)
        with Locations((20, -109.631168863)):
            Circle(SKETCH23_R_2)
        with Locations((32.99653198, -109.931429571)):
            Circle(SKETCH23_R_2)
        with Locations((87, -125)):
            Circle(SKETCH23_R_2)
        with Locations((71.839856939, -125)):
            Circle(SKETCH23_R_5)
        with Locations((100, -125)):
            Circle(SKETCH23_R_2)
        with Locations((113.463350925, -125)):
            Circle(SKETCH23_R_2)
        with Locations((130, -20.068570429)):
            Circle(SKETCH23_R_2)
        with Locations((130, -33.068570429)):
            Circle(SKETCH23_R_2)
        with Locations((130, -82)):
            Circle(SKETCH23_R_2)
        with Locations((130, -95)):
            Circle(SKETCH23_R_2)
        with Locations((115, -20.268570429)):
            Circle(SKETCH23_R_2)
        with Locations((115, -94.8)):
            Circle(SKETCH23_R_2)
    extrude(amount=-BOSS_EXTRUDE14_DEPTH)

    # Sketch24 → Boss-Extrude15 (add)
    with BuildSketch(Plane(origin=(0, 0, 0), x_dir=(-1, 0, 0), z_dir=(0, 0, -1))):
        with Locations((86.989397584, 9.821400511)):
            Circle(SKETCH24_R)
    extrude(amount=-BOSS_EXTRUDE15_DEPTH)

    # Sketch25 → Cut-Extrude15 (cut)
    with BuildSketch(Plane(origin=(0, 0, 0), x_dir=(-1, 0, 0), z_dir=(0, 0, -1))):
        with Locations((14, -57.497816758)):
            Rectangle(SKETCH25_W, SKETCH25_H)
    extrude(amount=-CUT_EXTRUDE15_DEPTH, mode=Mode.SUBTRACT)

    # Sketch26 → Cut-Extrude16 (cut)
    with BuildSketch(Plane(origin=(0, 0, 0), x_dir=(-1, 0, 0), z_dir=(0, 0, -1))):
        with Locations((103, 7.431429571)):
            Circle(SKETCH26_R)
        with Locations((95, 7.431429571)):
            Circle(SKETCH26_R)
        with Locations((87, 7.431429571)):
            Circle(SKETCH26_R)
        with Locations((103, -122.5)):
            Circle(SKETCH26_R)
        with Locations((95, -122.5)):
            Circle(SKETCH26_R)
        with Locations((87, -122.5)):
            Circle(SKETCH26_R)
    extrude(amount=-CUT_EXTRUDE16_DEPTH, mode=Mode.SUBTRACT)


solid = part.part
